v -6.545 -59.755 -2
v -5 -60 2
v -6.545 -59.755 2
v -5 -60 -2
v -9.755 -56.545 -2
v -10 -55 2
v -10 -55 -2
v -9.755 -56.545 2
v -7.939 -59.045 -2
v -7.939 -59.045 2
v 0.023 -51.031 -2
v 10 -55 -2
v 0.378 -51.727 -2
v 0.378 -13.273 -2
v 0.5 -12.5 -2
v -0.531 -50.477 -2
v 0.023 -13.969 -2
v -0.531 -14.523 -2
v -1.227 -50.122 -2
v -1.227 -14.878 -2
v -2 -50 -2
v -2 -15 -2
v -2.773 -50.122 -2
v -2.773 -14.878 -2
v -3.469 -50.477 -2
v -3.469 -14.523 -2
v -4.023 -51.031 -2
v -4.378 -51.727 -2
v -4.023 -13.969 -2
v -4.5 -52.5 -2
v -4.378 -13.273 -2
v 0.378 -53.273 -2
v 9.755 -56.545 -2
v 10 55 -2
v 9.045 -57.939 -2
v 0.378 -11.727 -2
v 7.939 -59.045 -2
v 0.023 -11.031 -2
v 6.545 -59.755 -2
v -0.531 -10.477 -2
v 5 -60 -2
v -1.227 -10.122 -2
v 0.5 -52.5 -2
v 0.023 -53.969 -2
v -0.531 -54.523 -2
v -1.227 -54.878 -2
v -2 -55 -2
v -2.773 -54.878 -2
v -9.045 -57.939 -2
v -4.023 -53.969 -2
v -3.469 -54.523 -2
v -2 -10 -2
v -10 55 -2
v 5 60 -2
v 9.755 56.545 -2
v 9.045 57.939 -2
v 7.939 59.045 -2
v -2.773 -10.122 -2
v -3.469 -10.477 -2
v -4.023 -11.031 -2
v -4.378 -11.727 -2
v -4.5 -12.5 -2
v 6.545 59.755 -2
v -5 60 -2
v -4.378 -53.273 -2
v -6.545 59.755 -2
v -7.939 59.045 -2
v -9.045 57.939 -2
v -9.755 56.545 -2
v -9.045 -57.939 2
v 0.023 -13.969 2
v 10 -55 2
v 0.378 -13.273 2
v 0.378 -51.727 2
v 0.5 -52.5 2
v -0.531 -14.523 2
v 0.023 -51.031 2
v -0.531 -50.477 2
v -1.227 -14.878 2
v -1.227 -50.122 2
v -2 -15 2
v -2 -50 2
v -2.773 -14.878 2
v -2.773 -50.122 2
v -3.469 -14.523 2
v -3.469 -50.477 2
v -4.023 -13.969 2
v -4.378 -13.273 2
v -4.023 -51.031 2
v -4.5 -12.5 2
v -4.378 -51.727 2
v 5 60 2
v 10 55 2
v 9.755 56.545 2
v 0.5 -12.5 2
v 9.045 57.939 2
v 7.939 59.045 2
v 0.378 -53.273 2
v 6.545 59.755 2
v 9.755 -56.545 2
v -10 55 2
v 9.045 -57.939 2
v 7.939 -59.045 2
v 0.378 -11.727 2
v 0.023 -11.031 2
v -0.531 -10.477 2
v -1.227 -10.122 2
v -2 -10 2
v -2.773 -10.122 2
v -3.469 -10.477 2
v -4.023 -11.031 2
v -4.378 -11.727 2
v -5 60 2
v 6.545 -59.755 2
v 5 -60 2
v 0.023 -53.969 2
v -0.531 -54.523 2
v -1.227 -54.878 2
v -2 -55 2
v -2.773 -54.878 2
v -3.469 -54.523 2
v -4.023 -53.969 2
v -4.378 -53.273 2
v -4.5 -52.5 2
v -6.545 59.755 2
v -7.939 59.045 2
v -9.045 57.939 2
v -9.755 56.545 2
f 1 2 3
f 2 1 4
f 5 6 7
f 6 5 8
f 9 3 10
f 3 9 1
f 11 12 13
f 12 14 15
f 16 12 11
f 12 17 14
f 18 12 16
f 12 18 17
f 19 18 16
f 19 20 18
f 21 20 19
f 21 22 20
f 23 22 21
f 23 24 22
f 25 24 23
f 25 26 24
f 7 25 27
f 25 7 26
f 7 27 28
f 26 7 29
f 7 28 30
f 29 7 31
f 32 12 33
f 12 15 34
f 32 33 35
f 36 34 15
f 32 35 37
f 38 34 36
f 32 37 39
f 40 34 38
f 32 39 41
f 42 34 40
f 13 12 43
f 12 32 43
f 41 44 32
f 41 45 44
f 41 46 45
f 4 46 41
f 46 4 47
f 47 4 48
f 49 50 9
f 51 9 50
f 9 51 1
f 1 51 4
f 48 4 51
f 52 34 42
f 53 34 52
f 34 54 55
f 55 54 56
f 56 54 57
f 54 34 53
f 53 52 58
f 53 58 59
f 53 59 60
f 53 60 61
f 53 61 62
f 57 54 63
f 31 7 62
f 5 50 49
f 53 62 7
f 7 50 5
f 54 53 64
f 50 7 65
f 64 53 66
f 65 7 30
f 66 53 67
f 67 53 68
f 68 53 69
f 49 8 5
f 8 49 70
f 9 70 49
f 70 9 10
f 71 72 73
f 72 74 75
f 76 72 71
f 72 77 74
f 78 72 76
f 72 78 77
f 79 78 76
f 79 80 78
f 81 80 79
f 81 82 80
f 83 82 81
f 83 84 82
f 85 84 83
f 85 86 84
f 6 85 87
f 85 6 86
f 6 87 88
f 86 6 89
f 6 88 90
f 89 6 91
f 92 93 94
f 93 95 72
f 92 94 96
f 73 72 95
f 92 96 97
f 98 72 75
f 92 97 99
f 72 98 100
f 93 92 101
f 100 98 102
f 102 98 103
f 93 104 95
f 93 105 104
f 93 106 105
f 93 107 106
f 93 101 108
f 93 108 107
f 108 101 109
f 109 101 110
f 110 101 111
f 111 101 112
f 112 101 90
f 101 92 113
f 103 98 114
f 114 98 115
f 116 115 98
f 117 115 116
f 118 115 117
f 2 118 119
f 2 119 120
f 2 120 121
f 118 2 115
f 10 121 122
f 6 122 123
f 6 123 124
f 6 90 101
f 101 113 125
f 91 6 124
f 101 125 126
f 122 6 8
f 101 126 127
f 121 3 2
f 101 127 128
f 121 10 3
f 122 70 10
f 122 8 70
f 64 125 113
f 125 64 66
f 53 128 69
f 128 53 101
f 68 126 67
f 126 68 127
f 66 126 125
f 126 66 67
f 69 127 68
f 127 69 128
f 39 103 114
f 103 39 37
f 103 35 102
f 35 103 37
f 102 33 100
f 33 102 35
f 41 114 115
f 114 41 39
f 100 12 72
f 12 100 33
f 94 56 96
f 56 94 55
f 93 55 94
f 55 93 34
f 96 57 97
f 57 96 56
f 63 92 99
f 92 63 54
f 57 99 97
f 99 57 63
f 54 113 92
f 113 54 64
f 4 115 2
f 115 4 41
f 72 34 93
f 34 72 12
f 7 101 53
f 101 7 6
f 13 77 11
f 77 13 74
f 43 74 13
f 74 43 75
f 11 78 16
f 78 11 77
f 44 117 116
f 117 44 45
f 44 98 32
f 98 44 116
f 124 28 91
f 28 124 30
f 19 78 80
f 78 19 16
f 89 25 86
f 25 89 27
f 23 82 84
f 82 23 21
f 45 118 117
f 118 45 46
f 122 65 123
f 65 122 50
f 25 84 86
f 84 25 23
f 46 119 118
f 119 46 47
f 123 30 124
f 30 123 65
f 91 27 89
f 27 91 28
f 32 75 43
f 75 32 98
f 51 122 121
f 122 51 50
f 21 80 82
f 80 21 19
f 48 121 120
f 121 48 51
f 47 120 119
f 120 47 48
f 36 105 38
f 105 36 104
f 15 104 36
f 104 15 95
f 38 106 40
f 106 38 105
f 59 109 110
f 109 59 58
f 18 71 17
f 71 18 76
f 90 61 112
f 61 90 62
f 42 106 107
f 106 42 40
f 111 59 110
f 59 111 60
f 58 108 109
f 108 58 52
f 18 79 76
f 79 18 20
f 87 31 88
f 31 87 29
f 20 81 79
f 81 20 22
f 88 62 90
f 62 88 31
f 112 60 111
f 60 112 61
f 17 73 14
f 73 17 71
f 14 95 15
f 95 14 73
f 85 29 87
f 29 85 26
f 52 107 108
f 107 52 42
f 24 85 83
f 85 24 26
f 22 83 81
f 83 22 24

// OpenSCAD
$fn = 20;

module arm(width, length, height, hole = [5, 5], gap_width = 0, gap_length = 0) {

    difference() {
        hull() {
            translate([0, - length / 2, 0])
                cylinder(h = height, r1 = width / 2, r2 = width / 2);

            translate([0, length / 2, 0])
                cylinder(h = height, r1 = width / 2, r2 = width / 2);
        }

        // Hole
        translate([0, - length / 2, -1])
            cylinder(h = height + 1, r1 = hole[0] / 2, r2 = hole[0] / 2);
        translate([0, length / 2, -1])
            cylinder(h = height + 1, r1 = hole[1] / 2, r2 = hole[1] / 2);

        if (gap_width) {
            difference() {
                translate([0, 0,  height / 2])
                    cube(size = [gap_width, length - width, height * 2], center = true);
                translate([0, - length / 2, 0])
                    cylinder(h = height * 2, r1 = width / 2 + gap_length, r2 = width / 2 + gap_length);
                translate([0, length / 2, 0])
                    cylinder(h = height * 2, r1 = width / 2 + gap_length, r2 = width / 2 + gap_length);
            }
        }
    }
}

// Long arm
module long_arm() {
    difference() {
        arm(15, 135, 4, [5, 1], 0, 0);
        
        translate([0, 12.5, -1])
            cylinder(h = 20, r1 = 2.5, r2 = 2.5);
    }
}

//long_arm();

// Basic arm
//arm(15, 80, 4, [5, 5], 0, 0);

module main_arm() {

    size = [ 20, 120, 4 ];
    radius = 5;

    difference() {
        union() {
            // From MCAD library
            cube(size - [2*radius,0,0], true);
            cube(size - [0,2*radius,0], true);
            for (x = [radius-size[0]/2, -radius+size[0]/2],
                   y = [radius-size[1]/2, -radius+size[1]/2]) {
                translate([x,y,0]) cylinder(r=radius, h=size[2], center=true);
            }
        }

        translate([ size[0] / 2 - 12, - size[1] / 2 + 7.5, -5]) {
            cylinder(h = 10, r1 = 2.5, r2 = 2.5);
        }

        translate([ size[0] / 2 - 12, - size[1] / 2 + 47.5, -5]) {
            cylinder(h = 10, r1 = 2.5, r2 = 2.5);
        }
    }
}

main_arm();
